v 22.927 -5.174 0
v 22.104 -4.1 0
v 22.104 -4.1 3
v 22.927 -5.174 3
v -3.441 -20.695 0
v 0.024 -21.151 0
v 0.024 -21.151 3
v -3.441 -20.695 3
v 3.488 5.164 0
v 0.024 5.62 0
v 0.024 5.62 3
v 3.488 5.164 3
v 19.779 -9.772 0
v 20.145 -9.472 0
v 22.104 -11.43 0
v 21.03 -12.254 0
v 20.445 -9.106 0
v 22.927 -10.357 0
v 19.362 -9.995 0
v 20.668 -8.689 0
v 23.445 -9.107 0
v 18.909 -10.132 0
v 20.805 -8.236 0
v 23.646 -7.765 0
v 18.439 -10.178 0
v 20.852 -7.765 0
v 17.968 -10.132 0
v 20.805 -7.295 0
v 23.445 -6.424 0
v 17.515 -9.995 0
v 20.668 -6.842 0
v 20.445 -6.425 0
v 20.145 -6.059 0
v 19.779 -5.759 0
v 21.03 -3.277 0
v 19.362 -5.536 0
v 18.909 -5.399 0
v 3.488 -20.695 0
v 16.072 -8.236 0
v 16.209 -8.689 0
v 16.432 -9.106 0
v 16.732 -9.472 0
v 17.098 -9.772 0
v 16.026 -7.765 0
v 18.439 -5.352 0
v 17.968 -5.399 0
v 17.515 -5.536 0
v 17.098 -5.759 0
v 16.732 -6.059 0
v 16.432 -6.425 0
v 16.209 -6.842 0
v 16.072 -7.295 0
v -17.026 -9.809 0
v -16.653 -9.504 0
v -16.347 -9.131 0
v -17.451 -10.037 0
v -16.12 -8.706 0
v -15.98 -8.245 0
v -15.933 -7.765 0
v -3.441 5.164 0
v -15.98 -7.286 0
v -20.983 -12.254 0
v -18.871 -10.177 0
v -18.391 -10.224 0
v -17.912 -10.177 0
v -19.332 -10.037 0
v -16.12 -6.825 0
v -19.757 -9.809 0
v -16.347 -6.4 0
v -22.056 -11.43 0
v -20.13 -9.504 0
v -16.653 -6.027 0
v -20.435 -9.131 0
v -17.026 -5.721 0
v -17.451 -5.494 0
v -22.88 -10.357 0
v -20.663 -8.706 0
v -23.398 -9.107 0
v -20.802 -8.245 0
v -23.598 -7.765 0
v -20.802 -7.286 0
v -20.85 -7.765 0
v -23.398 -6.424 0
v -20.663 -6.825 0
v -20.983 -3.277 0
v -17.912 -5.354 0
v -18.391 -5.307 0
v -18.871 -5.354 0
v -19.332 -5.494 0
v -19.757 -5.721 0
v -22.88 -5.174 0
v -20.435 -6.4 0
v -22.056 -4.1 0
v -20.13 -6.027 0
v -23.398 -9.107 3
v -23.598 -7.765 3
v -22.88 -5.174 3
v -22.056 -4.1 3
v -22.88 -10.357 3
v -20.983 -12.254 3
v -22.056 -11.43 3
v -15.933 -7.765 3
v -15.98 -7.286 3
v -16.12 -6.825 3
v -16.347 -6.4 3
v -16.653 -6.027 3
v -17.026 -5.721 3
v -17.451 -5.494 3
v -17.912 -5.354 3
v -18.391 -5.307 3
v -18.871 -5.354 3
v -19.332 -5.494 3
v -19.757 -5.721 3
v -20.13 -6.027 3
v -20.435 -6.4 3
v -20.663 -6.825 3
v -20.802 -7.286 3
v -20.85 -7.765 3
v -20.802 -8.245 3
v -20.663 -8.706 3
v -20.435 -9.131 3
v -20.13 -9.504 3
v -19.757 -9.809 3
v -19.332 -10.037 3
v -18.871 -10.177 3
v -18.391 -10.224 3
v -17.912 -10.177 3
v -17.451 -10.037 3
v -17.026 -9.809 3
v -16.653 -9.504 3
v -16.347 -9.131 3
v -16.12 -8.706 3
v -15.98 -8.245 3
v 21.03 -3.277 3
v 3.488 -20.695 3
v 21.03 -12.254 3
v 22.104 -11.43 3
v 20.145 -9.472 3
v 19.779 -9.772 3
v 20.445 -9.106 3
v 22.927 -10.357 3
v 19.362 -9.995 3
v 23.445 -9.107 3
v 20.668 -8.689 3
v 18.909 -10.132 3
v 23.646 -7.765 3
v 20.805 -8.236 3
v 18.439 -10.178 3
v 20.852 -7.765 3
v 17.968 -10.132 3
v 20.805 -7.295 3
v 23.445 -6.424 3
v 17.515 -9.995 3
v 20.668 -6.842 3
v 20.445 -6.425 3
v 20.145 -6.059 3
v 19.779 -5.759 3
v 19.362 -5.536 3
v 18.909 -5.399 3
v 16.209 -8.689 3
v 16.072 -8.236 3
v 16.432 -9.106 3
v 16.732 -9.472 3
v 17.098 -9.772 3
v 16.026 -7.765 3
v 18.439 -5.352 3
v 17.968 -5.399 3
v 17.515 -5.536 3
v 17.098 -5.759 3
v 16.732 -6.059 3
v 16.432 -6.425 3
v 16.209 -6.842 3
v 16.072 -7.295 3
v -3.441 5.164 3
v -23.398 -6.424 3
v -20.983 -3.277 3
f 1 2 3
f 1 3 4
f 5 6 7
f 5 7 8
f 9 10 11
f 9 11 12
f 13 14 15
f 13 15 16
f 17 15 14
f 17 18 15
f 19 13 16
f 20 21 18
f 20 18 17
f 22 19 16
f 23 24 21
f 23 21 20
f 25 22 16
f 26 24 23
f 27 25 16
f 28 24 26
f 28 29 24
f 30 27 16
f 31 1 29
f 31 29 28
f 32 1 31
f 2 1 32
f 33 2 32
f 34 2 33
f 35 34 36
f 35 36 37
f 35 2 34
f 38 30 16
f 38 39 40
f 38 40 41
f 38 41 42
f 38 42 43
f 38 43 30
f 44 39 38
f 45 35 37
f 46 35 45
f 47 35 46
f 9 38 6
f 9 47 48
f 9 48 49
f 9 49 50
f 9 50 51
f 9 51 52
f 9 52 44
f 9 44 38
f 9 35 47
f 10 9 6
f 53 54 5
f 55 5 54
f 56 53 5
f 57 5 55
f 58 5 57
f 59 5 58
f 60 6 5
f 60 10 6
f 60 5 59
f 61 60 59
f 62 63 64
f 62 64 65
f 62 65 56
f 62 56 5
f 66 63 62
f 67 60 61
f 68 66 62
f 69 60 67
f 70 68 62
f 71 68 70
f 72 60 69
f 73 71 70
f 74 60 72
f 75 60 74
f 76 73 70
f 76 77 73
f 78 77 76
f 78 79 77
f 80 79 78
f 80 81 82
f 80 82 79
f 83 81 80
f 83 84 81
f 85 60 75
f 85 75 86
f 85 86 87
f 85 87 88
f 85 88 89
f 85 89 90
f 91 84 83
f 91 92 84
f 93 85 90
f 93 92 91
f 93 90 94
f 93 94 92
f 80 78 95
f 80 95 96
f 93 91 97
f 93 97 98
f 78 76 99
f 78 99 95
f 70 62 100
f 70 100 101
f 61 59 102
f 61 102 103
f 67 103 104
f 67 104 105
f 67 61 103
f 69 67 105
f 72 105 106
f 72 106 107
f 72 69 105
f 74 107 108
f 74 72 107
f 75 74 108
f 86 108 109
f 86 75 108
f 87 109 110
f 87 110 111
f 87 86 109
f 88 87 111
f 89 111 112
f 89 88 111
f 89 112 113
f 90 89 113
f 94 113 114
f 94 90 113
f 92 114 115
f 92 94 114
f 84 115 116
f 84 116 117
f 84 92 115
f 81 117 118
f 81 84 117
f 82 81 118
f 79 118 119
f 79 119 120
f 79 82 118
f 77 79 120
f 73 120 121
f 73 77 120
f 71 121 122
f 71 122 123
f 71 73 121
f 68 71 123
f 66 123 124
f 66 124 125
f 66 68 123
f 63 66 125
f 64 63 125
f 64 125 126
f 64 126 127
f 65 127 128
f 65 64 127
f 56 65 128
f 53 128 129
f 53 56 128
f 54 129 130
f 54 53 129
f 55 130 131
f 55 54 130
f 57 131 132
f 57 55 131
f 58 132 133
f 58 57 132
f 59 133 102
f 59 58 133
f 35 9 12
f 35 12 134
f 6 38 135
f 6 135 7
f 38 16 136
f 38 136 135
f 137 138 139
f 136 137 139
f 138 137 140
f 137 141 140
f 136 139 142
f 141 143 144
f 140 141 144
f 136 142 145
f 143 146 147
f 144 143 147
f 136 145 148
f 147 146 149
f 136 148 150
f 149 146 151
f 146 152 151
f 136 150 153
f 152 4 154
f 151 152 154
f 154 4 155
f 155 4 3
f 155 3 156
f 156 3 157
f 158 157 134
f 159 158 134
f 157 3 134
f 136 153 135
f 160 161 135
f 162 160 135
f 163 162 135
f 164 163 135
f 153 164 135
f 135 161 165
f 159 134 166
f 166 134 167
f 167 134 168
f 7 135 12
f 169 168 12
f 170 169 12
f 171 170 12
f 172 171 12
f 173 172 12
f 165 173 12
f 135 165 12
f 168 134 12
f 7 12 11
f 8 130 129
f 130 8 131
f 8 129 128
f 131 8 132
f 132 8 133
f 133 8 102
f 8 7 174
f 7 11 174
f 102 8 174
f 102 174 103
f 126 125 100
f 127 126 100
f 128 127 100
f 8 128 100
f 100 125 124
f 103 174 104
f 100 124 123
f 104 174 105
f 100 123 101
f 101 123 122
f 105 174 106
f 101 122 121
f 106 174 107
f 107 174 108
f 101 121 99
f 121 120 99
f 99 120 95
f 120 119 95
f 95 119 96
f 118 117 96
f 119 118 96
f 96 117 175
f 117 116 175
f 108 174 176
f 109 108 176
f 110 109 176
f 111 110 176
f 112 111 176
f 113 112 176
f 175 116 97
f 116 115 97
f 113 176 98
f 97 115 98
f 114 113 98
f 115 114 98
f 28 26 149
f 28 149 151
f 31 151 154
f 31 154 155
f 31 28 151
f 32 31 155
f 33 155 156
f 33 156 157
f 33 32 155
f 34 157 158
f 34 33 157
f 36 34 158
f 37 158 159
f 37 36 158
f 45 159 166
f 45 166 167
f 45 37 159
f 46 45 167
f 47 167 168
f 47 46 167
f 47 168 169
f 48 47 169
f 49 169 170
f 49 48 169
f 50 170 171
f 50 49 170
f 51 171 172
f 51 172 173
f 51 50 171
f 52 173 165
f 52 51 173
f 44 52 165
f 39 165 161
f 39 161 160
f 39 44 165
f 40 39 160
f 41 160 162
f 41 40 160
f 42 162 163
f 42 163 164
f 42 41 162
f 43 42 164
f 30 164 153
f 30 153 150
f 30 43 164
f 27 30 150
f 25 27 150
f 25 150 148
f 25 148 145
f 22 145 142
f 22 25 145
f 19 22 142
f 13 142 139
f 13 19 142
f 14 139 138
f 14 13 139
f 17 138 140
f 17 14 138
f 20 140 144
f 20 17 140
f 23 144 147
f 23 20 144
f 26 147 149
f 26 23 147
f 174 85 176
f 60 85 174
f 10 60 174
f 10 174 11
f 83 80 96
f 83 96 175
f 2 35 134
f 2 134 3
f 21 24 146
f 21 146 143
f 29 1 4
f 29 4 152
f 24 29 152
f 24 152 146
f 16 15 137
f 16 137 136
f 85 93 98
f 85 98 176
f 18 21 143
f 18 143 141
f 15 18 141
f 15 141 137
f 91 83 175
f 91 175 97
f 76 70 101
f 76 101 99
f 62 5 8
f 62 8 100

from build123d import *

# Parameters (mm, degrees)
ESBO_O1_R                = 2.458273609
ESBO_O1_R_2              = 2.41299998
RESSALTO_EXTRUS_O2_DEPTH = 3


with BuildPart() as part:
    # Esboço1 → Ressalto-extrusão2 (new body)
    with BuildSketch(Plane.XY):
        Polygon((-3.440879294, 5.164211145), (0.023622001, 5.620321217), (0.023622001, -21.15127821), (-3.440879351, -20.69516813), (-20.982927009, -12.254172046), (-22.056381633, -11.43048149), (-22.880072189, -10.357026984), (-23.397865785, -9.106962052), (-23.598378589, -7.765478496), (-23.397865785, -6.423994009), (-22.880072189, -5.173929077), (-22.056381633, -4.100475502), (-20.982927009, -3.276784015), align=None)
        with Locations((-18.391378755, -7.765478496)):
            Circle(ESBO_O1_R, mode=Mode.SUBTRACT)
        Polygon((0.023622001, 5.620321217), (3.488123295, 5.164211145), (21.030171011, -3.276784015), (22.103625634, -4.100475502), (22.92731619, -5.173929077), (23.445109786, -6.423994009), (23.645622591, -7.765478496), (23.445109786, -9.106962052), (22.92731619, -10.357026984), (22.103625634, -11.43048149), (21.030171011, -12.254172046), (3.488123352, -20.69516813), (0.023622001, -21.15127821), align=None)
        with Locations((18.438620428, -7.765478496)):
            Circle(ESBO_O1_R_2, mode=Mode.SUBTRACT)
    extrude(amount=RESSALTO_EXTRUS_O2_DEPTH)


solid = part.part
